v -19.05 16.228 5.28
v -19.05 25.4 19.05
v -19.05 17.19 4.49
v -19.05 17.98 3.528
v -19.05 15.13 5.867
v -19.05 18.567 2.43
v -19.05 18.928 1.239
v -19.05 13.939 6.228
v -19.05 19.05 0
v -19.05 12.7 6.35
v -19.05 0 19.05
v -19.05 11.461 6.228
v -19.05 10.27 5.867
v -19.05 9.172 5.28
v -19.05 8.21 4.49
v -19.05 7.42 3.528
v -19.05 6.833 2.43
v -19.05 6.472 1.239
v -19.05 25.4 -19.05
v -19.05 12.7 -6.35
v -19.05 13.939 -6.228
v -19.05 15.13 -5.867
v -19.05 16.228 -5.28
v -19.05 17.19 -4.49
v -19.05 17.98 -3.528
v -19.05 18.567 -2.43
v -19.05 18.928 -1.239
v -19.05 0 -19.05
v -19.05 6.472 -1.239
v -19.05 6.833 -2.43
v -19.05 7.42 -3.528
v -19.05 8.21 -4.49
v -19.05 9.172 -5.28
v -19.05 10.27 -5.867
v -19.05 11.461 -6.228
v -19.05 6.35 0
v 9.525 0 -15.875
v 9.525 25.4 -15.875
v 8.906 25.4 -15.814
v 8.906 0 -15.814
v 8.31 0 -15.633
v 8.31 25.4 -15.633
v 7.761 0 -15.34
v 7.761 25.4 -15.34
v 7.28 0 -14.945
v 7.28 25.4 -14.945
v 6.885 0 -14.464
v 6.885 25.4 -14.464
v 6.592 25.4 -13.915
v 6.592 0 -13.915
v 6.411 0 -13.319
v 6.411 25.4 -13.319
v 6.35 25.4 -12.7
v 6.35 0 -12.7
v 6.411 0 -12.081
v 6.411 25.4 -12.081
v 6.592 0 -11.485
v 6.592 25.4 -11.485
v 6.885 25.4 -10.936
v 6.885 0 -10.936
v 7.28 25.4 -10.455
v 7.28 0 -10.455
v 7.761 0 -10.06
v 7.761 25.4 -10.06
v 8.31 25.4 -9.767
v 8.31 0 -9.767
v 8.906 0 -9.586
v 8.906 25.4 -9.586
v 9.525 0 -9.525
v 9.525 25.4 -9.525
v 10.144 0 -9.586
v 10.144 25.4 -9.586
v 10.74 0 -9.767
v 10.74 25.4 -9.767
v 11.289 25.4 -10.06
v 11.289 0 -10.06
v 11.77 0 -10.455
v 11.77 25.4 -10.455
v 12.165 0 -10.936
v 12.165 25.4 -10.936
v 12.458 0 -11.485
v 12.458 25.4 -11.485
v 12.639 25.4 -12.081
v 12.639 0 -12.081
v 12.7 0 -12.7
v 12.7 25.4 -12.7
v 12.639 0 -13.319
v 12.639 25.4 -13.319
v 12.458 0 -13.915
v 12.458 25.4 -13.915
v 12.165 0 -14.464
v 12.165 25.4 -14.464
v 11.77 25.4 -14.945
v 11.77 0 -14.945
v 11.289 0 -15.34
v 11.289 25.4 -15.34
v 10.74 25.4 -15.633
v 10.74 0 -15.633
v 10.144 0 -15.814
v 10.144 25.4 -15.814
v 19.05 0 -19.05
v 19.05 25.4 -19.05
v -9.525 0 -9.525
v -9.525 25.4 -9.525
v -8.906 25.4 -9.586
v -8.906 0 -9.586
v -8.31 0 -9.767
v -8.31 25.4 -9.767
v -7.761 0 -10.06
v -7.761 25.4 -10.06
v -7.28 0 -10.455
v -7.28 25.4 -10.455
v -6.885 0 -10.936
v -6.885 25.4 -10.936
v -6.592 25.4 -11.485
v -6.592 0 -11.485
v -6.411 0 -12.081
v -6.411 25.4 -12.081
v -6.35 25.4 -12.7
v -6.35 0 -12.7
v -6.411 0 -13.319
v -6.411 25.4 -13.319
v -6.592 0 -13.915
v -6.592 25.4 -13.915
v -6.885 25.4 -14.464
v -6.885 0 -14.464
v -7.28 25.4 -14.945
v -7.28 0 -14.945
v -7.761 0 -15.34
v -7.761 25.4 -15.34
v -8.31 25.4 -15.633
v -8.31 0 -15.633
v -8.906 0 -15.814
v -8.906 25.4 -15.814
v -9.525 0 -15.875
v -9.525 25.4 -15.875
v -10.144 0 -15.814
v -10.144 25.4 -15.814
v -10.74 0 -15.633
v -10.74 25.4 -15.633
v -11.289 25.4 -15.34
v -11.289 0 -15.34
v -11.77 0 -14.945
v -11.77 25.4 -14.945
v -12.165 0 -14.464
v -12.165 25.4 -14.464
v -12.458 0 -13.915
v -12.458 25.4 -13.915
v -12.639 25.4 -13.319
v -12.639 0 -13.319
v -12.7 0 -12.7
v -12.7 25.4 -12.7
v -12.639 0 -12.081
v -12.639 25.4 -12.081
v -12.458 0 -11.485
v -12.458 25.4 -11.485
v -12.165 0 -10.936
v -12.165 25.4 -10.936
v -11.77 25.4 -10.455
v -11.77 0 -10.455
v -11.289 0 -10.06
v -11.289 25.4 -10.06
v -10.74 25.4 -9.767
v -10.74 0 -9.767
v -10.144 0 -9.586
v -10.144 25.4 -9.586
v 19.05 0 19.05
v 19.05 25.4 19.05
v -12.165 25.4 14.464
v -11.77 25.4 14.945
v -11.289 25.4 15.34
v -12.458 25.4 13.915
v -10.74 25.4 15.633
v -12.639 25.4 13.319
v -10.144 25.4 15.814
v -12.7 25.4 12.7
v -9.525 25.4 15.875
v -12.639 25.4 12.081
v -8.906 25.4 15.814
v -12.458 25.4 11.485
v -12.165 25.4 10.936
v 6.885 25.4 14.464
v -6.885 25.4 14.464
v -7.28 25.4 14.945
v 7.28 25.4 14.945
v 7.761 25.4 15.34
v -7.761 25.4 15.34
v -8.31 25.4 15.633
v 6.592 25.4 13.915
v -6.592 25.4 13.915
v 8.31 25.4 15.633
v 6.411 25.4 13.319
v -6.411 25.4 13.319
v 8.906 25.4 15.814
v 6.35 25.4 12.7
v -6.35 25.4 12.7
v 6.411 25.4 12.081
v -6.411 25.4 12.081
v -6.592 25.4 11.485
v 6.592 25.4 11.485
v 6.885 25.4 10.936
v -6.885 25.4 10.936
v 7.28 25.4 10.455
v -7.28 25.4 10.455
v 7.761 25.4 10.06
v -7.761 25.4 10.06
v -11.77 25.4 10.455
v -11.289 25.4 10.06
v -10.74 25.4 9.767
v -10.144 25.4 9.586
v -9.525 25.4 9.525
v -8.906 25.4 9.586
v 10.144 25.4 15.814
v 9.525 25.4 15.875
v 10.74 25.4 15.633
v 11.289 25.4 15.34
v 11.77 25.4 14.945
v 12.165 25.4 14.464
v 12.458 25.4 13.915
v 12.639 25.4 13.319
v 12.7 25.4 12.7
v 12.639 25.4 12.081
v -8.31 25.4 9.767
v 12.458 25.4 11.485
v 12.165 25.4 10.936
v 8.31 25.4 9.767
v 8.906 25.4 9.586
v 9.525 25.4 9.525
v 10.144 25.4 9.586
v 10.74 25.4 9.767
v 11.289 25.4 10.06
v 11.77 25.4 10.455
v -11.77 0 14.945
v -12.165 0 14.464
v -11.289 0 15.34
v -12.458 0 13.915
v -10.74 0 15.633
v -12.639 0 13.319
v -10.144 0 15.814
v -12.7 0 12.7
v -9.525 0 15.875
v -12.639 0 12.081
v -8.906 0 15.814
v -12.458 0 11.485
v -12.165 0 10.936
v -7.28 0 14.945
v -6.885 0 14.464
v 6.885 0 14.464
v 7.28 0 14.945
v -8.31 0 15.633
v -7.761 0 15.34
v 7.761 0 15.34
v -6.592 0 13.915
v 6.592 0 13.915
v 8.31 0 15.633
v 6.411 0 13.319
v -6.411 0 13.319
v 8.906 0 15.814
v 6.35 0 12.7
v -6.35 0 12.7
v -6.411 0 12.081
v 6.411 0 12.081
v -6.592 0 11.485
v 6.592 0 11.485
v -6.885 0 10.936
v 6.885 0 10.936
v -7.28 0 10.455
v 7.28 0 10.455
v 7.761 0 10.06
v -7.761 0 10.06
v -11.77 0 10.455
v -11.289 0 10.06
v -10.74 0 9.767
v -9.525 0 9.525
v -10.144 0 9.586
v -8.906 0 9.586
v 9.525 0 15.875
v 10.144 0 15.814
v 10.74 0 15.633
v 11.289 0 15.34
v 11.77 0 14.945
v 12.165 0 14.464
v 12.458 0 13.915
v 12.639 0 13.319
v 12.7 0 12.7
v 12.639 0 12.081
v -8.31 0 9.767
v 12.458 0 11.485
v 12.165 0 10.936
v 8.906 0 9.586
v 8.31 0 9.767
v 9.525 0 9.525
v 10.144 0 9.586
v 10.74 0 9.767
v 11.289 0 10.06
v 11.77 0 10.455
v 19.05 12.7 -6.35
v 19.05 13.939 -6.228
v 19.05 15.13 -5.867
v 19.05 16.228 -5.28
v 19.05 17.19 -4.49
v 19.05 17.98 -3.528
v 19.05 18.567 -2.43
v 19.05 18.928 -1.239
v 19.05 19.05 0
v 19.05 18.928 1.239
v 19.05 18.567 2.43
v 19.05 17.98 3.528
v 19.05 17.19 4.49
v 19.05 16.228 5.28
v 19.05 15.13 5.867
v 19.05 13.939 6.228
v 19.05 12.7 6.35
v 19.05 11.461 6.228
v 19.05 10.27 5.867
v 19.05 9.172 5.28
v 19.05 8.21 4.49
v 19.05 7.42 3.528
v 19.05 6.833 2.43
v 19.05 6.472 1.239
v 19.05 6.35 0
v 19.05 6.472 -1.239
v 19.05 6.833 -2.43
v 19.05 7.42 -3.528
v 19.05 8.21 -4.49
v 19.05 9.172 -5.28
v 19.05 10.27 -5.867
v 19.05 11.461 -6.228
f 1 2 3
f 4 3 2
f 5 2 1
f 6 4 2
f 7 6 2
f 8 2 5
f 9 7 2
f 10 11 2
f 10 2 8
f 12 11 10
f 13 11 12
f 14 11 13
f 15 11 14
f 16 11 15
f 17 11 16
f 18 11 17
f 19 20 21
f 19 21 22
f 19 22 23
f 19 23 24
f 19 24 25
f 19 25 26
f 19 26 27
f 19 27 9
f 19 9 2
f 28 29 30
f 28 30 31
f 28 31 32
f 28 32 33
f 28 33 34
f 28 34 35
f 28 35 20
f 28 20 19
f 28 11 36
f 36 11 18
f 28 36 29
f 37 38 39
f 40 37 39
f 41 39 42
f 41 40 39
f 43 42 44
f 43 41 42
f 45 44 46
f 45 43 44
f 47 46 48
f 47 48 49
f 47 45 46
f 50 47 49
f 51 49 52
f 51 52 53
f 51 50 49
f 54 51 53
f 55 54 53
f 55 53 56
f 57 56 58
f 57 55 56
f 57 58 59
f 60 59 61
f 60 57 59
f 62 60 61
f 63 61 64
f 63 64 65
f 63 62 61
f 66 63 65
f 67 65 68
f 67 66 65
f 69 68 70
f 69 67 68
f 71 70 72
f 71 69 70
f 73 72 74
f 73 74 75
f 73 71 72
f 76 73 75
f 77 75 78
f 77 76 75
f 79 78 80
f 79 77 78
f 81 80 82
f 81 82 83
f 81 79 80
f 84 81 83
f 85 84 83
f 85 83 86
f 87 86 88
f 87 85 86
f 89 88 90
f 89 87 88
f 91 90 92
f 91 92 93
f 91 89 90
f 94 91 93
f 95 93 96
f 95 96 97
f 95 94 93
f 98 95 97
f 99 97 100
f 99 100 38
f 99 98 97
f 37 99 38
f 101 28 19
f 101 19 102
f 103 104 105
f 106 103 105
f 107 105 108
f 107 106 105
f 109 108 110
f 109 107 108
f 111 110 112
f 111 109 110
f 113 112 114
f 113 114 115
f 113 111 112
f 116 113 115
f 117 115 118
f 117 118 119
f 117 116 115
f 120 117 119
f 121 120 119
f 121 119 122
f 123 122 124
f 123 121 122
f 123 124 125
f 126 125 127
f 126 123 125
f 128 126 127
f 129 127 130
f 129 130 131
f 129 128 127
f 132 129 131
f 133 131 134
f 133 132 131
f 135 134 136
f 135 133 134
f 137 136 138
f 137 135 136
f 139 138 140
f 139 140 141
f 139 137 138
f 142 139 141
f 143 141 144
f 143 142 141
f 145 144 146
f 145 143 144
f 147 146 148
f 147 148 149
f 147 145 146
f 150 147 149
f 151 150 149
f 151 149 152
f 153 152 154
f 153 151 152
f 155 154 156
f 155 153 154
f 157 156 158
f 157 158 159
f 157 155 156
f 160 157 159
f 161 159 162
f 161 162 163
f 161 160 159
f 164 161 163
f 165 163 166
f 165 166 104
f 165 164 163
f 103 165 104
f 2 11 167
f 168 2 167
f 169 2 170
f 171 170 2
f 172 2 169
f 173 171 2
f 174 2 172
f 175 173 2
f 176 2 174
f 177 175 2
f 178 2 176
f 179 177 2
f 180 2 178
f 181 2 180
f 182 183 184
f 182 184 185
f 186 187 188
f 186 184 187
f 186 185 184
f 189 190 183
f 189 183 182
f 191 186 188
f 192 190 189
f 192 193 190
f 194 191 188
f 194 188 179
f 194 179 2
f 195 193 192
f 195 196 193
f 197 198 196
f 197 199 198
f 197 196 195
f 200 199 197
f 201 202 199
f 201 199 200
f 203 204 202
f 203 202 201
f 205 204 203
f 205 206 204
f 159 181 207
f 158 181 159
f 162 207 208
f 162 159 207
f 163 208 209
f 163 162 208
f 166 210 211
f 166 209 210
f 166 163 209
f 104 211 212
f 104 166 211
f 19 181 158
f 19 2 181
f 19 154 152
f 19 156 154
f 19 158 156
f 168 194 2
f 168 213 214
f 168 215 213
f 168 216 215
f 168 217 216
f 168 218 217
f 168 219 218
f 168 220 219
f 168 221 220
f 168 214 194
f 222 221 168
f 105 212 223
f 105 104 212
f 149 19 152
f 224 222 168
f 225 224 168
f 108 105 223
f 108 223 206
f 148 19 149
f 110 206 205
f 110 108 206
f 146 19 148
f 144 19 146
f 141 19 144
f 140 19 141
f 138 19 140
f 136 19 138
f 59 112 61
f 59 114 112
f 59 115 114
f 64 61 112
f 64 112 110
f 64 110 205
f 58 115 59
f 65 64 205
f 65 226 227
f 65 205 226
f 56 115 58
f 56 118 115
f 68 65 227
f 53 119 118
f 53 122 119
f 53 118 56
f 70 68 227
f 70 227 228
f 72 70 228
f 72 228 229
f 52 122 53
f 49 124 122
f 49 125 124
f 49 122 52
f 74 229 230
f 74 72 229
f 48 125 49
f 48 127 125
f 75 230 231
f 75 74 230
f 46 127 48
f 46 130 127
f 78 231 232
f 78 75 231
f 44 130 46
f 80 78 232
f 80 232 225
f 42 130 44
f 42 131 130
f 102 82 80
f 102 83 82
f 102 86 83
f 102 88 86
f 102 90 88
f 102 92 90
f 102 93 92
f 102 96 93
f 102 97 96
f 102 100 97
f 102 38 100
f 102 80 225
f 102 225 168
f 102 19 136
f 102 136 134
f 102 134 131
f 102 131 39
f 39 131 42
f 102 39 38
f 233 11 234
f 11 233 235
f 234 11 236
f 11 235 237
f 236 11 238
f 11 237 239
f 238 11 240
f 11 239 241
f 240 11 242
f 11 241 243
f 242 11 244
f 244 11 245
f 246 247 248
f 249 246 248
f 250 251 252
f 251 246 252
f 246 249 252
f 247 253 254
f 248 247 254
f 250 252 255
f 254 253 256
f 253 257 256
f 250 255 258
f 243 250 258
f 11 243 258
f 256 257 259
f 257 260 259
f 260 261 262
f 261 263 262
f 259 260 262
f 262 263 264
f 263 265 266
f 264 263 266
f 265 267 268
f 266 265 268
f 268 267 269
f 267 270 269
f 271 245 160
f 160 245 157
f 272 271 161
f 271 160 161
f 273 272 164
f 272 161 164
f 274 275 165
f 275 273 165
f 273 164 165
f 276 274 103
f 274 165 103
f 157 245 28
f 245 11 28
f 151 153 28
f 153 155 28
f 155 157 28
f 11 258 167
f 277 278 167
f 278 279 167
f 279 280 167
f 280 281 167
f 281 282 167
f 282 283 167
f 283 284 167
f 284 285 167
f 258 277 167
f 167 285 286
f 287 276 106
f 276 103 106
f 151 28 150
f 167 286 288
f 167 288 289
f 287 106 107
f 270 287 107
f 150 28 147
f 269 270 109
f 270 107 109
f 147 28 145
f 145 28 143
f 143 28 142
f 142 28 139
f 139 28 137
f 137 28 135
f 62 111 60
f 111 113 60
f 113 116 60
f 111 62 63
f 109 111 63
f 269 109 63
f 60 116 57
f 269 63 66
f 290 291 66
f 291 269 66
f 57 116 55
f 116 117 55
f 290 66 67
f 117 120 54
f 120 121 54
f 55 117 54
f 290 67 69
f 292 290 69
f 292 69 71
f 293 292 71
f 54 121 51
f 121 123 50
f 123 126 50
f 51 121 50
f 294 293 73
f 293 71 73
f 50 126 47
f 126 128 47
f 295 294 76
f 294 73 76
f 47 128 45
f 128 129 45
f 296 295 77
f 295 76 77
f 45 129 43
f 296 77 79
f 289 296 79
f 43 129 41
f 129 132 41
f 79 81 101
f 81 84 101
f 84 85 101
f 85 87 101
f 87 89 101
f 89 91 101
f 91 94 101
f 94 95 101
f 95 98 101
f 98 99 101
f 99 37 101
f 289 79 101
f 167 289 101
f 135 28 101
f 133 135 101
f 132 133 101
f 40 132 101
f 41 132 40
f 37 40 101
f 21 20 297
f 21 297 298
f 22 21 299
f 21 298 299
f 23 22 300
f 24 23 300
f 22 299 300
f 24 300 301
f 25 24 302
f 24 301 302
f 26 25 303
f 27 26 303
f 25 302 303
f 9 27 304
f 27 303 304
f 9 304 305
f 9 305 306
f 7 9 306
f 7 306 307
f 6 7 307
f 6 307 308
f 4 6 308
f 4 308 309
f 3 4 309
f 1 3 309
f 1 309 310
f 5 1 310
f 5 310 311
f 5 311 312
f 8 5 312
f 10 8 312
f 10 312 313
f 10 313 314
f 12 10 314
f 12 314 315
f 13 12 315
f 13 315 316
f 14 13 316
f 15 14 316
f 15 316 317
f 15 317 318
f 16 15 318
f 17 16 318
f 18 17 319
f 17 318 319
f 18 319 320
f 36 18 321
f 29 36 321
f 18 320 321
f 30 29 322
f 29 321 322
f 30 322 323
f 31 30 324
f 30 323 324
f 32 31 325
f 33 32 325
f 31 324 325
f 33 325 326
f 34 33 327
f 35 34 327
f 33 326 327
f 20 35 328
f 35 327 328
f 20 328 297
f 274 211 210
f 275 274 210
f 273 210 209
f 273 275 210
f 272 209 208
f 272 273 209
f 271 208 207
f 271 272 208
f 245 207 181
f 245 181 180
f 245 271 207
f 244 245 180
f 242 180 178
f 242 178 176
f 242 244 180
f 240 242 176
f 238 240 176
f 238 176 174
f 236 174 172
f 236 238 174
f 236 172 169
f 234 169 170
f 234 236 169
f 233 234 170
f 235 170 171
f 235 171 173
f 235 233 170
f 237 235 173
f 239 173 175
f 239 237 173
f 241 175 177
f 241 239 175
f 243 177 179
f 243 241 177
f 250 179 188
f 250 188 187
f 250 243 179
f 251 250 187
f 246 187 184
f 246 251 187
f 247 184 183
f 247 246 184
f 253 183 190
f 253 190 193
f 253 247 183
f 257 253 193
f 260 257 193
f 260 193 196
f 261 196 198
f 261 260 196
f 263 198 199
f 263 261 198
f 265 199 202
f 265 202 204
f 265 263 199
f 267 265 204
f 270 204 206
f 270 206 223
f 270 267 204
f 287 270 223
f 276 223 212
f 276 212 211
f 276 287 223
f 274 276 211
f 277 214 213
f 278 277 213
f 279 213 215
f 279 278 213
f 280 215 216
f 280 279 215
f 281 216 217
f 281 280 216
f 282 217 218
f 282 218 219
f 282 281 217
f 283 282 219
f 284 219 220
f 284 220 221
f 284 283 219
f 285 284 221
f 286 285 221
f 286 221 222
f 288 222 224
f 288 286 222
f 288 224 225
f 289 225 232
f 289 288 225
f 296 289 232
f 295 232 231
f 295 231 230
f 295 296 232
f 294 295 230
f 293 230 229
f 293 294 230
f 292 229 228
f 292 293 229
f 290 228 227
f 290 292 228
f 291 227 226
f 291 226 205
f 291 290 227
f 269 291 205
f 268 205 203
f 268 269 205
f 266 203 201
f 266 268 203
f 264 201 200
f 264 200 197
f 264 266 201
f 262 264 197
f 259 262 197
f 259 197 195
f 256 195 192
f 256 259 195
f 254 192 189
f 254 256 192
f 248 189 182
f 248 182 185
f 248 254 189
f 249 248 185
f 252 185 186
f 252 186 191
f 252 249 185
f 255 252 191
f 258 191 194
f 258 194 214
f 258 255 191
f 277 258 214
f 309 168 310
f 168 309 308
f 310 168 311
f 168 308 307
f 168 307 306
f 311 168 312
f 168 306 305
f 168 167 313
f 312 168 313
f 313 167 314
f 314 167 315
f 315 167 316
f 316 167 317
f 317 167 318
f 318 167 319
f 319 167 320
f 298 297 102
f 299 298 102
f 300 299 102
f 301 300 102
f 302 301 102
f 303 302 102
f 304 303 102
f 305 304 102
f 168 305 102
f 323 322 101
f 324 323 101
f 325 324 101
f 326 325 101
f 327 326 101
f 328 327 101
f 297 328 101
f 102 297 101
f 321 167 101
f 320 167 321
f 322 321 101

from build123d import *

# Parameters (mm, degrees)
SKETCH1_W           = 38.1
SKETCH1_H           = 38.1
SKETCH1_R           = 3.175
BOSS_EXTRUDE1_DEPTH = 25.4
SKETCH2_R           = 6.35
CUT_EXTRUDE1_DEPTH  = 50.595085442


with BuildPart() as part:
    # Sketch1 → Boss-Extrude1 (new body)
    with BuildSketch(Plane(origin=(0, 0, 0), x_dir=(1, 0, 0), z_dir=(0, 1, 0))):
        Rectangle(SKETCH1_W, SKETCH1_H)
        with Locations(Location((-9.525, 12.7, 0), (0, 0, 270))):
            Circle(SKETCH1_R, mode=Mode.SUBTRACT)
        with Locations(Location((9.525, 12.7, 0), (0, 0, 90))):
            Circle(SKETCH1_R, mode=Mode.SUBTRACT)
        with Locations(Location((9.525, -12.7, 0), (0, 0, 270))):
            Circle(SKETCH1_R, mode=Mode.SUBTRACT)
        with Locations(Location((-9.525, -12.7, 0), (0, 0, 90))):
            Circle(SKETCH1_R, mode=Mode.SUBTRACT)
    extrude(amount=BOSS_EXTRUDE1_DEPTH)

    # Sketch2 → Cut-Extrude1 (cut, through all)
    with BuildSketch(Plane(origin=(19.05, 0, 0), x_dir=(0, 0, -1), z_dir=(1, 0, 0))):
        with Locations((0, 12.7)):
            Circle(SKETCH2_R)
    extrude(amount=-CUT_EXTRUDE1_DEPTH, mode=Mode.SUBTRACT)


solid = part.part
